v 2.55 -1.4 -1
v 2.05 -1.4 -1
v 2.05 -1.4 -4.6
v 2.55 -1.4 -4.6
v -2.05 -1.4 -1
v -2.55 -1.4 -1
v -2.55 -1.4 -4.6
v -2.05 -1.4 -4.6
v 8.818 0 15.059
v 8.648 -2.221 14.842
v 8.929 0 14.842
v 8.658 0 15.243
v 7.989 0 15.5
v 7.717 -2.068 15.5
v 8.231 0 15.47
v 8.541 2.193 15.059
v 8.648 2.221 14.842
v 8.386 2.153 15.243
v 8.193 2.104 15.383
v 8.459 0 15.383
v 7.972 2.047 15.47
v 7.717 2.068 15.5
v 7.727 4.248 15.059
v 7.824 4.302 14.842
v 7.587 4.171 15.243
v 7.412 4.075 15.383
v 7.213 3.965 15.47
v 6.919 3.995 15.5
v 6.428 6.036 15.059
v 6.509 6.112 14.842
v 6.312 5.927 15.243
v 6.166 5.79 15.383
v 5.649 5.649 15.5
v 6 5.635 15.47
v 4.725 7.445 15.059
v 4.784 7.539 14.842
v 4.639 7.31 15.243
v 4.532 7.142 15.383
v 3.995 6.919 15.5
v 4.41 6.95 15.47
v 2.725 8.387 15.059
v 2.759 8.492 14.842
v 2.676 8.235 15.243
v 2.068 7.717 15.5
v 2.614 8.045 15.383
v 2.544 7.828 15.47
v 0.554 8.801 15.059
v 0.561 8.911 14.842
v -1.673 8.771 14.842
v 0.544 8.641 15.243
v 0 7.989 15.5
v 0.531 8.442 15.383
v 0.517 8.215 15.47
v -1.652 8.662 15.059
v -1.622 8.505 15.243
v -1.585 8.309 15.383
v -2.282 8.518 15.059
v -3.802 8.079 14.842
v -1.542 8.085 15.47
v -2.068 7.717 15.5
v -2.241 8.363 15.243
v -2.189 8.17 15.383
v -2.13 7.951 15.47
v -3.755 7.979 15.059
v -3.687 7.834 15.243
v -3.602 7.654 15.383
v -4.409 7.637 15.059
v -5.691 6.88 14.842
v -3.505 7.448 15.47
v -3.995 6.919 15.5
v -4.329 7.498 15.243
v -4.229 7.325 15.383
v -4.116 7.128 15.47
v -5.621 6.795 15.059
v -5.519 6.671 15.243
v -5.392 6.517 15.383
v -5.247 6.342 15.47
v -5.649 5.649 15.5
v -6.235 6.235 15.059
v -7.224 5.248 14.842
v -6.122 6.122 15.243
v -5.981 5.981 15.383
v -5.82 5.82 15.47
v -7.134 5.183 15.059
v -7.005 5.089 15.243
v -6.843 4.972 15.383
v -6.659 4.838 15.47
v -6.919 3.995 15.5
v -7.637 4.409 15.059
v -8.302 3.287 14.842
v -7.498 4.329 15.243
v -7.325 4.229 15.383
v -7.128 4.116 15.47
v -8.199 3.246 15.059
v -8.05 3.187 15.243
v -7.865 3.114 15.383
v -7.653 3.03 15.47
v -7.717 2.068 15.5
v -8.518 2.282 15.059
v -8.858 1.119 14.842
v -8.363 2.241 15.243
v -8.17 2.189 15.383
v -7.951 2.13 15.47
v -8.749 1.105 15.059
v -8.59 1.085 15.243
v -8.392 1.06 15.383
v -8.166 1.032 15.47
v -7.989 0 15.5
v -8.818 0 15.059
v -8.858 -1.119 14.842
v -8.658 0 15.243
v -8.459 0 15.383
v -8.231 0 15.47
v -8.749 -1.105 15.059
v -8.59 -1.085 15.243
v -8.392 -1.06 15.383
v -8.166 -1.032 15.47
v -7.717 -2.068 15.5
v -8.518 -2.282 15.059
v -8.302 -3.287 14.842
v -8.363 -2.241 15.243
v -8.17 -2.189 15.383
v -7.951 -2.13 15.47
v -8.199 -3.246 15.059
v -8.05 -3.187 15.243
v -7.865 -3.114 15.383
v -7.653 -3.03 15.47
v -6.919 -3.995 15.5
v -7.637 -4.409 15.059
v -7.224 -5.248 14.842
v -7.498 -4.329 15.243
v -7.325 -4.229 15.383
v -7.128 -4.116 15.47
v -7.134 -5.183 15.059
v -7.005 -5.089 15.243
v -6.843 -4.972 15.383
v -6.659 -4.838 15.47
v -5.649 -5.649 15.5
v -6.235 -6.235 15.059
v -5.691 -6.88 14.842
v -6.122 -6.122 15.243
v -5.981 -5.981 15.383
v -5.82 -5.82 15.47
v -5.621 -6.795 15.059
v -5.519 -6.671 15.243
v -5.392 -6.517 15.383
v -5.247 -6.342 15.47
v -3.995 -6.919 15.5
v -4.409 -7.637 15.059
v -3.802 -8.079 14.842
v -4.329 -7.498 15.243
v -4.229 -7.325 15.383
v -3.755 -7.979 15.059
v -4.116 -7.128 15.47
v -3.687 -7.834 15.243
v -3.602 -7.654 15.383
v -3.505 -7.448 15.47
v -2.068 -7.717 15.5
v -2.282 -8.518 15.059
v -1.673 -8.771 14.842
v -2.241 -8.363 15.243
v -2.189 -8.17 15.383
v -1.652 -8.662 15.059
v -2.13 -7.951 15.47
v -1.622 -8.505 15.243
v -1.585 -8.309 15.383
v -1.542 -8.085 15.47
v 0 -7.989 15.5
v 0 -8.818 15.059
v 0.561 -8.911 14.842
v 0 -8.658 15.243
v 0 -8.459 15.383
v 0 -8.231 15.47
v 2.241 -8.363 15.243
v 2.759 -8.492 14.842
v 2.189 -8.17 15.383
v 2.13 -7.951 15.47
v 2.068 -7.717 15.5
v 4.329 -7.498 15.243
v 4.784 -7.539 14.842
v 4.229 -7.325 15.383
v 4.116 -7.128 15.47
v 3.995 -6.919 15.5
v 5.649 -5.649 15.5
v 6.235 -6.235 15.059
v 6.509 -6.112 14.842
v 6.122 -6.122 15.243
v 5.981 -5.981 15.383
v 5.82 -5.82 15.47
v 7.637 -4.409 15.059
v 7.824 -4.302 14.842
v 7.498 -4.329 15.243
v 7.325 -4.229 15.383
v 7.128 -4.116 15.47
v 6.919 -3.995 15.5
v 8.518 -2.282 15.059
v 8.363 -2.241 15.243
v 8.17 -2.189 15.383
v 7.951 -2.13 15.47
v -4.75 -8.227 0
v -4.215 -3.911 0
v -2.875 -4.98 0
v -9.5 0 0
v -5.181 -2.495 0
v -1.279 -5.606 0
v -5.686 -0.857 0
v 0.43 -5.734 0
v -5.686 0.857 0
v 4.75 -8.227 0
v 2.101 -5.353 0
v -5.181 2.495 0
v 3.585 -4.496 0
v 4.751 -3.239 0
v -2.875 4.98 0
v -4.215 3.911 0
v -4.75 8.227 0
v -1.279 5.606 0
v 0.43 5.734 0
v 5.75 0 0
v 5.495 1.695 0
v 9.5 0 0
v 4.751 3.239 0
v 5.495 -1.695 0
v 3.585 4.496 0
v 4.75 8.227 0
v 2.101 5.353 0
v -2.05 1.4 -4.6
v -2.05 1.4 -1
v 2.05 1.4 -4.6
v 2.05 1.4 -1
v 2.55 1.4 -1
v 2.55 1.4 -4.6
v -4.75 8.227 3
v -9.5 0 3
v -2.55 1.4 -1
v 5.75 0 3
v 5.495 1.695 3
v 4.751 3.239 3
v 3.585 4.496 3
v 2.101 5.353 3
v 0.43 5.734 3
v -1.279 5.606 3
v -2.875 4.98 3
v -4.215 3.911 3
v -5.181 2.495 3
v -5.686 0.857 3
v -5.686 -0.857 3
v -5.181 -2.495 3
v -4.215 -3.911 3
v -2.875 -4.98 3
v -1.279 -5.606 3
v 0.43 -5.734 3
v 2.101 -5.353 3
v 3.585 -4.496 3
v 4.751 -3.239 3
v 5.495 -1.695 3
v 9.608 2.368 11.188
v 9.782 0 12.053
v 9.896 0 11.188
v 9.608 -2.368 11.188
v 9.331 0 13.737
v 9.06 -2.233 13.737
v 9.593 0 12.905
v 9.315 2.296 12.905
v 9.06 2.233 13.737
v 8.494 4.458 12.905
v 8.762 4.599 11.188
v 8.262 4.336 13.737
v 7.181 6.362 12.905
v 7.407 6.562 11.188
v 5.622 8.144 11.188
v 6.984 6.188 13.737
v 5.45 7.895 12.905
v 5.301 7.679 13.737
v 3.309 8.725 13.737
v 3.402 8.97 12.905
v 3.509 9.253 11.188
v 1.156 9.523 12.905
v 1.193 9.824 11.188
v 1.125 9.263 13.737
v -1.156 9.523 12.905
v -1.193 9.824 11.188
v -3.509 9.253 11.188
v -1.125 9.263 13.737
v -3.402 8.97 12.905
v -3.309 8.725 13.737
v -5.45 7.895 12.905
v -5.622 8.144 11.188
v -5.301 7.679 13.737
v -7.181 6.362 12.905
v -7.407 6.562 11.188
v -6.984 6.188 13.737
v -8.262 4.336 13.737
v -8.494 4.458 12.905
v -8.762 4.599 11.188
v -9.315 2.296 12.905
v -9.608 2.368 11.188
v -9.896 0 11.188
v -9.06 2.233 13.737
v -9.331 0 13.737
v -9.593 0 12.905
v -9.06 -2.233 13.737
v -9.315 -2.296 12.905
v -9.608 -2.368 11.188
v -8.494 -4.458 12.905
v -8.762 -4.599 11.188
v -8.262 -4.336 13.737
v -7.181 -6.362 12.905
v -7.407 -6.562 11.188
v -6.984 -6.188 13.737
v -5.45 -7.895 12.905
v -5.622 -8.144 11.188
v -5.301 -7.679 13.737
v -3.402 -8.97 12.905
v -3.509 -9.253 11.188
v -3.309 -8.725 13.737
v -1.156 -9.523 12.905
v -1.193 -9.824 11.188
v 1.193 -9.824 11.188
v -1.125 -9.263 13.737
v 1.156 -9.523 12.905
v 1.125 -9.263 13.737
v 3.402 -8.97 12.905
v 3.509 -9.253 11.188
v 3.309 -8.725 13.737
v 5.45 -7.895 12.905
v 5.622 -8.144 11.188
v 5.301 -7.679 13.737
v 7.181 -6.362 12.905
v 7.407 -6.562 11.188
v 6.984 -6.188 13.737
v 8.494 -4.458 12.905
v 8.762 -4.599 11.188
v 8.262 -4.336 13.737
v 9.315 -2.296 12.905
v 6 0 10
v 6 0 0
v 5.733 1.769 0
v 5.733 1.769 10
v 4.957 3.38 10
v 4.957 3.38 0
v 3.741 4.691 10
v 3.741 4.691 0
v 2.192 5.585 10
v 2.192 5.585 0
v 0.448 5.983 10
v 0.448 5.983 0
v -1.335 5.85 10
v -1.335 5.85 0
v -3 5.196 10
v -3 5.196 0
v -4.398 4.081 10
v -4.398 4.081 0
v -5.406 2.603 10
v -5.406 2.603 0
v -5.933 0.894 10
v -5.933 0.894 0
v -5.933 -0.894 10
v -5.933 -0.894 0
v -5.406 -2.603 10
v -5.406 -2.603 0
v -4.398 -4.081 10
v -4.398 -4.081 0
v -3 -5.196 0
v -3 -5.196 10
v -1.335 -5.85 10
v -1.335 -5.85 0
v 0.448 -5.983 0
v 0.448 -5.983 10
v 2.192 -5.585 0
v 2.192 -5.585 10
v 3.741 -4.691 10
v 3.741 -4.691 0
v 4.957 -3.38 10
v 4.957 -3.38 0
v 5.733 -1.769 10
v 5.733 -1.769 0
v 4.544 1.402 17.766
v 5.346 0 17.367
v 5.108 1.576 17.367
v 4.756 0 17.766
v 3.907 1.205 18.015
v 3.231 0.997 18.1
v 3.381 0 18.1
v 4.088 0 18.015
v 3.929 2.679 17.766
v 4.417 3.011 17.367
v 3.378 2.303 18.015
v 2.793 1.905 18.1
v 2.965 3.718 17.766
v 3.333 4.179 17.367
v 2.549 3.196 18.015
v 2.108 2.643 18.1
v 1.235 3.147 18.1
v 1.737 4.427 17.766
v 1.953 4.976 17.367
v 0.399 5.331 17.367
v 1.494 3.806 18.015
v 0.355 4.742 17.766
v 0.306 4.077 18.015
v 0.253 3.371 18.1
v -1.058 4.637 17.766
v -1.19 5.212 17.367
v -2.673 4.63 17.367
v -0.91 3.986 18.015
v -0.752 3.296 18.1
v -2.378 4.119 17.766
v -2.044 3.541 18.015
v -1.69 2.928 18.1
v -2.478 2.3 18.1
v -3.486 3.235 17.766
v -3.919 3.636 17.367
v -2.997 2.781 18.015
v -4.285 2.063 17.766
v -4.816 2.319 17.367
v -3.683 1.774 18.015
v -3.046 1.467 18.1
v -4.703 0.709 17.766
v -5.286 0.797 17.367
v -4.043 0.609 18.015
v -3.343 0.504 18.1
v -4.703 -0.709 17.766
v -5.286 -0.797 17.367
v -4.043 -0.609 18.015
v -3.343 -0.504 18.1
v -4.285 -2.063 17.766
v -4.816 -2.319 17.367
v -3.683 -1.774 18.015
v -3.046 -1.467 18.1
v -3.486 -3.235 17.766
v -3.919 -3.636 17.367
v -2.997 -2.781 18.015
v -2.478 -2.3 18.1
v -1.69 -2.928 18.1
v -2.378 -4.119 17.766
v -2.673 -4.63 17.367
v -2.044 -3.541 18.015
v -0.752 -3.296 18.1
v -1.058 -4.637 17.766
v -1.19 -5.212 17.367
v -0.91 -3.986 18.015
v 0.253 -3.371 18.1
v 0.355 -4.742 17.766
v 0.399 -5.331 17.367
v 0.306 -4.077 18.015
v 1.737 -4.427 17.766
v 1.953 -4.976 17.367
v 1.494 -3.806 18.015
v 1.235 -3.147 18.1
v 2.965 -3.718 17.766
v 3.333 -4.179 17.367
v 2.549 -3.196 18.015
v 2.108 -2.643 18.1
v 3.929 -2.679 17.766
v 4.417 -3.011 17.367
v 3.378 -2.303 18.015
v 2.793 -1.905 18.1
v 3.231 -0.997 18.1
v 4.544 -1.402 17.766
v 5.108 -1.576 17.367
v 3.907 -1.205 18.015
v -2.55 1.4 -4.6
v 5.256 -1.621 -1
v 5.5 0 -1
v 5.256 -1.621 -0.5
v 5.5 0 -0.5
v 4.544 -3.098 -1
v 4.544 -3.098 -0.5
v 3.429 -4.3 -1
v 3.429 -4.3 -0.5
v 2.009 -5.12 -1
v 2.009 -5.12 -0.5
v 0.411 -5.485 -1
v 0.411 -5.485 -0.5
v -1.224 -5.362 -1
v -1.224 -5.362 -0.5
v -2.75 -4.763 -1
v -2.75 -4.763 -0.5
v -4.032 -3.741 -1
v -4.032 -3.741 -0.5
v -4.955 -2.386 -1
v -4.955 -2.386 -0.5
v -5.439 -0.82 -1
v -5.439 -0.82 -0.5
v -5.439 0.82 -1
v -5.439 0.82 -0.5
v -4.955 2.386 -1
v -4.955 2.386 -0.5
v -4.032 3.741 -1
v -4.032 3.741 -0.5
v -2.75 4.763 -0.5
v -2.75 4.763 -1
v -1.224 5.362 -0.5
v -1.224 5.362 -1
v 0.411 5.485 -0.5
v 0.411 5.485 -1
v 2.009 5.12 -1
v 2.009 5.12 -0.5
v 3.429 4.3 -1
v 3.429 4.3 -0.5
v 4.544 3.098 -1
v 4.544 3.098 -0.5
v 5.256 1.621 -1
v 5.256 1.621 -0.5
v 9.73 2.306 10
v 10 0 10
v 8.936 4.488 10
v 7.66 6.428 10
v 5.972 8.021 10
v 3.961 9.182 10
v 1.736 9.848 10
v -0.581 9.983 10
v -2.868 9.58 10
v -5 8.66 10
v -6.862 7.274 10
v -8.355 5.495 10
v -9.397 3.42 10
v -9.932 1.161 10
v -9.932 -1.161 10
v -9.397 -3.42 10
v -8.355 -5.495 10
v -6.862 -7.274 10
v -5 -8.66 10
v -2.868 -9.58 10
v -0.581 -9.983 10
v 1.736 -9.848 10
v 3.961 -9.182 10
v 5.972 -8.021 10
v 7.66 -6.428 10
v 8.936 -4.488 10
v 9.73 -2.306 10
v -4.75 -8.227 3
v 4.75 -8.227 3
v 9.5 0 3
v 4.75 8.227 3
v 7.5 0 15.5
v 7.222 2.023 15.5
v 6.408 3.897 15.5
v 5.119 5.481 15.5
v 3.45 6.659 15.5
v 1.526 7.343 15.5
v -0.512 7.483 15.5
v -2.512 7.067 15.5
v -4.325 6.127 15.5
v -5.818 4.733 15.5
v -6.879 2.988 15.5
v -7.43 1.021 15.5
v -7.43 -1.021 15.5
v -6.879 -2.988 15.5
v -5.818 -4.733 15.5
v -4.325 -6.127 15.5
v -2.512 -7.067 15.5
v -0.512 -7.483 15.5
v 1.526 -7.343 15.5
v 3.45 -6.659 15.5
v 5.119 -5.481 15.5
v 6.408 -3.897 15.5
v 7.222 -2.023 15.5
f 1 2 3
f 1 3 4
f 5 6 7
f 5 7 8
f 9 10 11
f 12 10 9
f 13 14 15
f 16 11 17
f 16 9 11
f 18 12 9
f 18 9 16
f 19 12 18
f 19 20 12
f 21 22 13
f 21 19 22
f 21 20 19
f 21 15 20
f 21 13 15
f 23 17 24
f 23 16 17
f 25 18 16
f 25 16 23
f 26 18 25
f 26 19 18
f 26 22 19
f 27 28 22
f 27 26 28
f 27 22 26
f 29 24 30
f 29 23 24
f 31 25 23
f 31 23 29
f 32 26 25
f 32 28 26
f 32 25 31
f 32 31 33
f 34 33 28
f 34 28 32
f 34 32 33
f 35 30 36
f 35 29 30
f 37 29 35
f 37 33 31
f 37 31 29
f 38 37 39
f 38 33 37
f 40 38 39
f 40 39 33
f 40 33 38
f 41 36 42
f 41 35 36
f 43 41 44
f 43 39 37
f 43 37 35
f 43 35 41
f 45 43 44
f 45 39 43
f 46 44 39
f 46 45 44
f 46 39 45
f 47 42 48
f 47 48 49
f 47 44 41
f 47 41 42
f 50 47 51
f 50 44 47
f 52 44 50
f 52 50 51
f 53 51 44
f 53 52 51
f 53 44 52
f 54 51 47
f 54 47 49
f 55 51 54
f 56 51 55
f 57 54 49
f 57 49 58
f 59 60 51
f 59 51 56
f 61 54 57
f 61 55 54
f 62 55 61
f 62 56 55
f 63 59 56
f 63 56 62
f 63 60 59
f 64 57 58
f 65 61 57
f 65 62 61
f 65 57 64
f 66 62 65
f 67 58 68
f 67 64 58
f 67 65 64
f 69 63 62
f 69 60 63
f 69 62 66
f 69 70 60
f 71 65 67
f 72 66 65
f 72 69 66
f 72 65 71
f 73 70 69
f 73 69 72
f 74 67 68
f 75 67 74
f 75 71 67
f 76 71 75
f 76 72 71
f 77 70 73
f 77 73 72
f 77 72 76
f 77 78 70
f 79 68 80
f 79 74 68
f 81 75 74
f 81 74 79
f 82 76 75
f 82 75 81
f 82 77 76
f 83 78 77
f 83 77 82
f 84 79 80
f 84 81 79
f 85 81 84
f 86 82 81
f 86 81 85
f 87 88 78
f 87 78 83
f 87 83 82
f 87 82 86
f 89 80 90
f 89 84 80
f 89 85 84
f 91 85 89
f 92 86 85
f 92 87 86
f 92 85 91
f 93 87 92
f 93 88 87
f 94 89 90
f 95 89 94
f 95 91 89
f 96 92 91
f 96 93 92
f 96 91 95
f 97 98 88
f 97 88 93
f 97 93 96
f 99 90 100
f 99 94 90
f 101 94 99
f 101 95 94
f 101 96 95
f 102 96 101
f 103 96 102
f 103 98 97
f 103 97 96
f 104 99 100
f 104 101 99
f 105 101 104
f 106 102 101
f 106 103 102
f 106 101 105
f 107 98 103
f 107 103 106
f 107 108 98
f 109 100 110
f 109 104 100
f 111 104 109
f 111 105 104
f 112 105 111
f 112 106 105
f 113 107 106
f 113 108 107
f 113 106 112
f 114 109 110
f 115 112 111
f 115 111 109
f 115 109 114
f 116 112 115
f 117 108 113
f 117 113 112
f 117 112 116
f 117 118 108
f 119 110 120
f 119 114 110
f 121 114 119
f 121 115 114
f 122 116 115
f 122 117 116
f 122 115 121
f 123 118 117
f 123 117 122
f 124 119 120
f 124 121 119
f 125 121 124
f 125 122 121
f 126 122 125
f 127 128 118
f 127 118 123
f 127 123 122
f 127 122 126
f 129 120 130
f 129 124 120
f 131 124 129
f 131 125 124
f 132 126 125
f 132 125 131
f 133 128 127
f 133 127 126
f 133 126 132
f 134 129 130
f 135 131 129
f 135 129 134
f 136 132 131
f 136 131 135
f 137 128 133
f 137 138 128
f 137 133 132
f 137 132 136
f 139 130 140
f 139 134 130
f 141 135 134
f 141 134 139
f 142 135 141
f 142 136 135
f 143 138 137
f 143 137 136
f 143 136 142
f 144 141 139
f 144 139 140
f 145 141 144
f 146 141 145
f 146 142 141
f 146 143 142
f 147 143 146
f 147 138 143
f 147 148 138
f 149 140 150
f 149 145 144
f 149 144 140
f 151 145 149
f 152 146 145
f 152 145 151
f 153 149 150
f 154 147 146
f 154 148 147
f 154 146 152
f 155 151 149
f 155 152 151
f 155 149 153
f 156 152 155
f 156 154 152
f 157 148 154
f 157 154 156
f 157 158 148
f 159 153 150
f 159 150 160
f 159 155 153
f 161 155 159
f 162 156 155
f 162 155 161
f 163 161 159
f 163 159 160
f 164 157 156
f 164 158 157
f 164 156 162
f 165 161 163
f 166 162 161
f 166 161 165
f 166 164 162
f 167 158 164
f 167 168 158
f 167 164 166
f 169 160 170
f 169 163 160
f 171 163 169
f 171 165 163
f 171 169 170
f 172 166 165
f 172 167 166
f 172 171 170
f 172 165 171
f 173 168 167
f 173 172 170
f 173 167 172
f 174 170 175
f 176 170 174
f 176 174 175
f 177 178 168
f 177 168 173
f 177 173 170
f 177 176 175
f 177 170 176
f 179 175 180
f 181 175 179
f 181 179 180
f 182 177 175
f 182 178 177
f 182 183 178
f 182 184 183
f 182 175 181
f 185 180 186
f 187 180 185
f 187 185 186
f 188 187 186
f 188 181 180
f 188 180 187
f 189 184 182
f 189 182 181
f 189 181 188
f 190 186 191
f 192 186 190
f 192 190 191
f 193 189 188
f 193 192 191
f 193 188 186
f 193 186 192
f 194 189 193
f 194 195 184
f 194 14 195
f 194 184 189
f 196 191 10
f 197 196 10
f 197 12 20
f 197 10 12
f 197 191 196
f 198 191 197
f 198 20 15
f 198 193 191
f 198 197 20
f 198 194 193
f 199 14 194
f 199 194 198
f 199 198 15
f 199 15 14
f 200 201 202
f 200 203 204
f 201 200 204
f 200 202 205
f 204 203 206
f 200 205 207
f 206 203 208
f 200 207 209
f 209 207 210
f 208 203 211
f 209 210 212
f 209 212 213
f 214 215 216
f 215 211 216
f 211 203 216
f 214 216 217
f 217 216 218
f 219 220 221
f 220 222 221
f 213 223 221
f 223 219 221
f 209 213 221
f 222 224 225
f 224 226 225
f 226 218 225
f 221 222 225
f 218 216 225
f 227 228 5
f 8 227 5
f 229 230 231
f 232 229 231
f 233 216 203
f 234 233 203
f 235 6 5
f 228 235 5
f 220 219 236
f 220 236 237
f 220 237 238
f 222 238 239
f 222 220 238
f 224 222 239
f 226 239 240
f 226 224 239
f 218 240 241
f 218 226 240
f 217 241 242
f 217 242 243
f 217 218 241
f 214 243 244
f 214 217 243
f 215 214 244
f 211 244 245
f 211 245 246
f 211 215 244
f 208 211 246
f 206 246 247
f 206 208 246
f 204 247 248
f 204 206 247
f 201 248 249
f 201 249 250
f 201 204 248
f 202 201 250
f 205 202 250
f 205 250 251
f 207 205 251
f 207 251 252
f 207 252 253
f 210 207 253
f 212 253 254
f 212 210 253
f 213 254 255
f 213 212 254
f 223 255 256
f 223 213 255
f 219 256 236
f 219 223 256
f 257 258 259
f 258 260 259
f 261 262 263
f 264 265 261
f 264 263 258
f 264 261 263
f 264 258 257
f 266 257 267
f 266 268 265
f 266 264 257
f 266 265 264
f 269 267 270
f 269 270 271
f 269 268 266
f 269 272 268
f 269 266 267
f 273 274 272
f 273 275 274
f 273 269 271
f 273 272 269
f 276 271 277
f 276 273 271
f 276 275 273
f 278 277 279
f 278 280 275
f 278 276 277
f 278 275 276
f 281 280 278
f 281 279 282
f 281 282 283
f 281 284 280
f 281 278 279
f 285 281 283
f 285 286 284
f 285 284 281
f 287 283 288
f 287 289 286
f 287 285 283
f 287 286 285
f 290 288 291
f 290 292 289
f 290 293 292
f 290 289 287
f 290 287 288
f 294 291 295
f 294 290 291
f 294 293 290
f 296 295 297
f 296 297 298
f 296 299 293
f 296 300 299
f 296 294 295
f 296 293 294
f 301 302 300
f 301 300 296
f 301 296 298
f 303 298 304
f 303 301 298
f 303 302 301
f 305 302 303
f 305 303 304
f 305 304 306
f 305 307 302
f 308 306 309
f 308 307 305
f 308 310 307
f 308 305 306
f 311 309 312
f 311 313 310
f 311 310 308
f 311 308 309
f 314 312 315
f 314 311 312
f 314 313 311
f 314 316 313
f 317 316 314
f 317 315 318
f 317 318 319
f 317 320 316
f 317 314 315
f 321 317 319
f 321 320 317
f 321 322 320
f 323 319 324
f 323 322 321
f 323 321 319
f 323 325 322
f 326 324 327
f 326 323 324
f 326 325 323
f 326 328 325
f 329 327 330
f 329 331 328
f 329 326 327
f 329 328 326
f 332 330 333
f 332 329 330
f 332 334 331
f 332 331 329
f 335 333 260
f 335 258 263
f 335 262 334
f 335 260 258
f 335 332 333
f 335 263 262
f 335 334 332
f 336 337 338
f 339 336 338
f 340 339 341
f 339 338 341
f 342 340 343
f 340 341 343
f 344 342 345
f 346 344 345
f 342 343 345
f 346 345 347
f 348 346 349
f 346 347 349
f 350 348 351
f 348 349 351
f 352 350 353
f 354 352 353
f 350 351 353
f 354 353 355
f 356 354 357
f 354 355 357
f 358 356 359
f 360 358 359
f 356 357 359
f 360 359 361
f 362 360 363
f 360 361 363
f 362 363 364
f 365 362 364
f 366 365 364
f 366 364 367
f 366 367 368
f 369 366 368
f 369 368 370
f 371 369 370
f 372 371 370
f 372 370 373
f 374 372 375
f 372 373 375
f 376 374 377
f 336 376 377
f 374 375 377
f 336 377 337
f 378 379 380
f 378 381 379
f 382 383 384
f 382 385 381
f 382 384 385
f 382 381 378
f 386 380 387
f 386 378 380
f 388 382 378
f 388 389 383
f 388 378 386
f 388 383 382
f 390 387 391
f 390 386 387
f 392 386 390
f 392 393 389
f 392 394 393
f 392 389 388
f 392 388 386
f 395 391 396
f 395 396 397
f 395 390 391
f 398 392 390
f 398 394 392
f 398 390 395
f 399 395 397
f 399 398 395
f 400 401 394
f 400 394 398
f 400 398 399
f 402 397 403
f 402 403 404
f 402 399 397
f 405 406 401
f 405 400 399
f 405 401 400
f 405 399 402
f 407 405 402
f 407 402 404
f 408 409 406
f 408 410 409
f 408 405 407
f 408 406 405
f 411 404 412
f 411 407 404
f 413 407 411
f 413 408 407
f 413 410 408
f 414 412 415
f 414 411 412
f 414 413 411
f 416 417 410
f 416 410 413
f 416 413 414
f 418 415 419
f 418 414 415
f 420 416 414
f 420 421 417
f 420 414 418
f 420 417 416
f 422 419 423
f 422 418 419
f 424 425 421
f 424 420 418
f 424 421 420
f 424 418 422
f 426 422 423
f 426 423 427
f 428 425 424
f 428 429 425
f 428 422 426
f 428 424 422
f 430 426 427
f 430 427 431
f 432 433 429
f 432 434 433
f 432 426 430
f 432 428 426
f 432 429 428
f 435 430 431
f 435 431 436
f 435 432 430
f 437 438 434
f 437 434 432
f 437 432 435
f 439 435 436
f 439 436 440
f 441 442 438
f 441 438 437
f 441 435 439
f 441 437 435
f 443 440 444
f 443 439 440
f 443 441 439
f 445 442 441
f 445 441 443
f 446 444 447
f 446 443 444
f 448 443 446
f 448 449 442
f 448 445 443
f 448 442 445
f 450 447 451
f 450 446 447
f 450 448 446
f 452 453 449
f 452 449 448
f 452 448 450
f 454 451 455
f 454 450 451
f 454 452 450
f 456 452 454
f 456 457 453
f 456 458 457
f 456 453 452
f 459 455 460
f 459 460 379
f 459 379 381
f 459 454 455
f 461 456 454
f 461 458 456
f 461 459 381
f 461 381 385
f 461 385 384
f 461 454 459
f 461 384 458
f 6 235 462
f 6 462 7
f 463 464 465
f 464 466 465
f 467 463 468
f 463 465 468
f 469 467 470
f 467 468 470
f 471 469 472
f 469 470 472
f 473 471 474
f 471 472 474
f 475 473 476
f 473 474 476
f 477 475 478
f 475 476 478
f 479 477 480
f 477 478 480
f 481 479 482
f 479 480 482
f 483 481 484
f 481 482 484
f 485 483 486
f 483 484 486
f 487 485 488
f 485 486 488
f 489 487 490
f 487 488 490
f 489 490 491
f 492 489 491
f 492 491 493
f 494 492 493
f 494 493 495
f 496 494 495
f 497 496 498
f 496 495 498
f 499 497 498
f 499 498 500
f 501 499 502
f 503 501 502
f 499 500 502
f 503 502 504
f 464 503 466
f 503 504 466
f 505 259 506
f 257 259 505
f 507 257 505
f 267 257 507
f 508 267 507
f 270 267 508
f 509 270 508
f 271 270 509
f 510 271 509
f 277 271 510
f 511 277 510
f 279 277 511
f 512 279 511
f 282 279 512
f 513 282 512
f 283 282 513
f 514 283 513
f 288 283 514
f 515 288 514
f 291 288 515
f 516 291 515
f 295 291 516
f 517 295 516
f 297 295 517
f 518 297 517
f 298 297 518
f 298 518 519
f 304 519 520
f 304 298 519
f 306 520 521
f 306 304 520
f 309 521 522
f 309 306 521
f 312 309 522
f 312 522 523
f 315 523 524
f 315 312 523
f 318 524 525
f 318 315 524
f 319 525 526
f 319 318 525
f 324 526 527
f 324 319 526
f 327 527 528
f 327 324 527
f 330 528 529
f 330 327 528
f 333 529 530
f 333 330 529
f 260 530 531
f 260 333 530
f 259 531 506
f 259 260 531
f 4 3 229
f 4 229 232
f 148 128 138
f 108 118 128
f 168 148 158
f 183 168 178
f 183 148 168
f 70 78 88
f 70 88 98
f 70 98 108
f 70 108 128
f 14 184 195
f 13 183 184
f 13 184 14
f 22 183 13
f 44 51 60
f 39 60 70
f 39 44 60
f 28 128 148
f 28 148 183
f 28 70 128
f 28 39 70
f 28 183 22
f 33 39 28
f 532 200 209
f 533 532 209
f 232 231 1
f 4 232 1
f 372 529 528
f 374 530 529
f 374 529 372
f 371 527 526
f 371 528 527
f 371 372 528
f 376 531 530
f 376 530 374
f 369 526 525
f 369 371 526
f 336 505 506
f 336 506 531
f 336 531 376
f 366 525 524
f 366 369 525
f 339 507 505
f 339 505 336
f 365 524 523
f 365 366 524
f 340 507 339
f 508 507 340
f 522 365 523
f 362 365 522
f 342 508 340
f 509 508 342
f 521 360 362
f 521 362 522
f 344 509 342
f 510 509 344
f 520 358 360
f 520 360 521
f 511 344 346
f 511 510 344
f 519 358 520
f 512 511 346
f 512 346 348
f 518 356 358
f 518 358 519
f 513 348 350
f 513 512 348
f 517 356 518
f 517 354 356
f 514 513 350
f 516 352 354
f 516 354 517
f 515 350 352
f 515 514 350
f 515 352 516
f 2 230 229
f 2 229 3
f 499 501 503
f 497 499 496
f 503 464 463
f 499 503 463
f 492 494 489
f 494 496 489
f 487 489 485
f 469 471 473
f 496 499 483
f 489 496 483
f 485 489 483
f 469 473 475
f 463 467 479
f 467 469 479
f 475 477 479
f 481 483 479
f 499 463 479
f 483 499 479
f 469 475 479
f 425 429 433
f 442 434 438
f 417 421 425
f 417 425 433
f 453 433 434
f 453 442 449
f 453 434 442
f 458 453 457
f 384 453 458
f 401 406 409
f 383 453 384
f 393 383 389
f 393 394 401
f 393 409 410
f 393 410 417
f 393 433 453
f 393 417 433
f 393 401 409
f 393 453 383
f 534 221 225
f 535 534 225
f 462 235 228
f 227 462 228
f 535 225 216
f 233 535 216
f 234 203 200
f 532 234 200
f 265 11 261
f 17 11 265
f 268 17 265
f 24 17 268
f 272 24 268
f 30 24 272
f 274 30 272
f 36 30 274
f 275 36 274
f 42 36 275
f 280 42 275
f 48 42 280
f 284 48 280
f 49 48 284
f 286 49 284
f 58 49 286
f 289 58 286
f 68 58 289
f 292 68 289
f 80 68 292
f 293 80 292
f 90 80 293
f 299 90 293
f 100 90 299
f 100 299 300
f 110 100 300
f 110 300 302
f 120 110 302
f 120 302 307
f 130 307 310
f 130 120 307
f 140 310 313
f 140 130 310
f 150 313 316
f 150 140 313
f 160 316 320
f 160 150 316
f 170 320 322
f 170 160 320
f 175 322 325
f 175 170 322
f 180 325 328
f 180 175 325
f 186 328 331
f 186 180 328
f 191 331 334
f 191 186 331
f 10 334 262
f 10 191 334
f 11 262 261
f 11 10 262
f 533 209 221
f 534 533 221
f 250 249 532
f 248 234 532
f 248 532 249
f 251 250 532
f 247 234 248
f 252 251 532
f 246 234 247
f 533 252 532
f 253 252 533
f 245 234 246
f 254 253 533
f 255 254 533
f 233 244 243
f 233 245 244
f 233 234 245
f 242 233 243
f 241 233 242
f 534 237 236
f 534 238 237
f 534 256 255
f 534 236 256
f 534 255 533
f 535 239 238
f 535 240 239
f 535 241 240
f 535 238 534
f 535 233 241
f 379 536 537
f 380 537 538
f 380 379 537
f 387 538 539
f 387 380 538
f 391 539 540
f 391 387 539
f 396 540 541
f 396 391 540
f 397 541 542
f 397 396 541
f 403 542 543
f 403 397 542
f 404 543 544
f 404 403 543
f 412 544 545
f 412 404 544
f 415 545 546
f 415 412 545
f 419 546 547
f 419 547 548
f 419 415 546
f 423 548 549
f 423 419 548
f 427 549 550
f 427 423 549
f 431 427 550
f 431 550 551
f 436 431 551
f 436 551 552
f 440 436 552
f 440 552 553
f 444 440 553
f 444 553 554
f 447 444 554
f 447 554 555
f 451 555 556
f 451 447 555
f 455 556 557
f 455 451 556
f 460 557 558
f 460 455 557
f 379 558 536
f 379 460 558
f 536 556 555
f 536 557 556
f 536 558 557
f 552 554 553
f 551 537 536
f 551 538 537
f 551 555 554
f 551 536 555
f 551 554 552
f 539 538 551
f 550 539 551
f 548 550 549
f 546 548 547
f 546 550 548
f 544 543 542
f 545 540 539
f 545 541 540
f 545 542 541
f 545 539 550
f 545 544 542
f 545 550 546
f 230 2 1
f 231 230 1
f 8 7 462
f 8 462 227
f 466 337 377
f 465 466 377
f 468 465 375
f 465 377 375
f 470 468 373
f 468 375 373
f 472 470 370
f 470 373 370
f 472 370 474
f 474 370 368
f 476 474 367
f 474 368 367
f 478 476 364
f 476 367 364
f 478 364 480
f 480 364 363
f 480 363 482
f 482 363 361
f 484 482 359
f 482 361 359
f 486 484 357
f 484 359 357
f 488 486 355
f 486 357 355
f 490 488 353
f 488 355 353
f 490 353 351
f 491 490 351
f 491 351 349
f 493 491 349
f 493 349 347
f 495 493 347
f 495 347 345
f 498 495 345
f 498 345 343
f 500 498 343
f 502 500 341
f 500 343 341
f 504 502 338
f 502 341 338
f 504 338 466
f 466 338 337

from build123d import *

# Parameters (mm, degrees)
F0_R      = 6
F1_DEPTH  = 10
F4_W      = 0.5
F4_H      = 2.8
F5_DEPTH  = 3.6
F10_R     = 5.75
F11_DEPTH = 3


with BuildPart() as f1:
    # F0 (on Top) → F1 (new body)
    with BuildSketch(Plane.XY):
        Circle(F0_R)
    extrude(amount=F1_DEPTH)

    # F2 (on Front) → F3 (revolve)
    with BuildSketch(Plane.XZ):
        Polygon((5.5, -0.5), (6, 0), (0, 0), (0, -1), (5.5, -1), align=None)
    revolve(axis=Axis((0, 0, -1.316218), (0, 0, -1)))

    # F6 (on Front) → F7 (revolve)
    with BuildSketch(Plane.XZ):
        with BuildLine():
            Line((0, 15.5), (0, 10))
            Line((0, 10), (10, 10))
            Line((10, 10), (9.896021, 11.188485))
            ThreePointArc((9.896021, 11.188485), (9.697034, 12.481324), (9.331, 13.737129))
            Line((9.331, 13.737129), (8.928853, 14.84202))
            ThreePointArc((8.928853, 14.84202), (8.562737, 15.319152), (7.98916, 15.5))
            Line((7.98916, 15.5), (0, 15.5))
        make_face()
    revolve(axis=Axis((0, 0, 14.191122), (0, 0, 1)))


with BuildPart() as f5:
    # F4 (on face) → F5 (new body)
    with BuildSketch(Plane(origin=(0, 0, -1), x_dir=(1, 0, 0), z_dir=(0, 0, -1))):
        with Locations((2.3, 0)):
            Rectangle(F4_W, F4_H)
        with Locations((-2.3, 0)):
            Rectangle(F4_W, F4_H)
    extrude(amount=F5_DEPTH)


with BuildPart() as f9:
    # F8 (on Front) → F9 (revolve)
    with BuildSketch(Plane.XZ):
        with BuildLine():
            Line((0, 18.1), (0, 15.5))
            Line((0, 15.5), (7.5, 15.5))
            Line((7.5, 15.5), (5.345692, 17.367067))
            ThreePointArc((5.345692, 17.367067), (4.429422, 17.910801), (3.3809, 18.1))
            Line((3.3809, 18.1), (0, 18.1))
        make_face()
    revolve(axis=Axis((0, 0, 9.80562), (0, 0, 1)))


with BuildPart() as f11:
    # F10 (on Top) → F11 (new body)
    with BuildSketch(Plane.XY):
        Polygon((-9.5, 0), (-4.75, -8.227241), (4.75, -8.227241), (9.5, 0), (4.75, 8.227241), (-4.75, 8.227241), align=None)
        Circle(F10_R, mode=Mode.SUBTRACT)
    extrude(amount=F11_DEPTH)


solid = Compound([f1.part, f5.part, f9.part, f11.part])
